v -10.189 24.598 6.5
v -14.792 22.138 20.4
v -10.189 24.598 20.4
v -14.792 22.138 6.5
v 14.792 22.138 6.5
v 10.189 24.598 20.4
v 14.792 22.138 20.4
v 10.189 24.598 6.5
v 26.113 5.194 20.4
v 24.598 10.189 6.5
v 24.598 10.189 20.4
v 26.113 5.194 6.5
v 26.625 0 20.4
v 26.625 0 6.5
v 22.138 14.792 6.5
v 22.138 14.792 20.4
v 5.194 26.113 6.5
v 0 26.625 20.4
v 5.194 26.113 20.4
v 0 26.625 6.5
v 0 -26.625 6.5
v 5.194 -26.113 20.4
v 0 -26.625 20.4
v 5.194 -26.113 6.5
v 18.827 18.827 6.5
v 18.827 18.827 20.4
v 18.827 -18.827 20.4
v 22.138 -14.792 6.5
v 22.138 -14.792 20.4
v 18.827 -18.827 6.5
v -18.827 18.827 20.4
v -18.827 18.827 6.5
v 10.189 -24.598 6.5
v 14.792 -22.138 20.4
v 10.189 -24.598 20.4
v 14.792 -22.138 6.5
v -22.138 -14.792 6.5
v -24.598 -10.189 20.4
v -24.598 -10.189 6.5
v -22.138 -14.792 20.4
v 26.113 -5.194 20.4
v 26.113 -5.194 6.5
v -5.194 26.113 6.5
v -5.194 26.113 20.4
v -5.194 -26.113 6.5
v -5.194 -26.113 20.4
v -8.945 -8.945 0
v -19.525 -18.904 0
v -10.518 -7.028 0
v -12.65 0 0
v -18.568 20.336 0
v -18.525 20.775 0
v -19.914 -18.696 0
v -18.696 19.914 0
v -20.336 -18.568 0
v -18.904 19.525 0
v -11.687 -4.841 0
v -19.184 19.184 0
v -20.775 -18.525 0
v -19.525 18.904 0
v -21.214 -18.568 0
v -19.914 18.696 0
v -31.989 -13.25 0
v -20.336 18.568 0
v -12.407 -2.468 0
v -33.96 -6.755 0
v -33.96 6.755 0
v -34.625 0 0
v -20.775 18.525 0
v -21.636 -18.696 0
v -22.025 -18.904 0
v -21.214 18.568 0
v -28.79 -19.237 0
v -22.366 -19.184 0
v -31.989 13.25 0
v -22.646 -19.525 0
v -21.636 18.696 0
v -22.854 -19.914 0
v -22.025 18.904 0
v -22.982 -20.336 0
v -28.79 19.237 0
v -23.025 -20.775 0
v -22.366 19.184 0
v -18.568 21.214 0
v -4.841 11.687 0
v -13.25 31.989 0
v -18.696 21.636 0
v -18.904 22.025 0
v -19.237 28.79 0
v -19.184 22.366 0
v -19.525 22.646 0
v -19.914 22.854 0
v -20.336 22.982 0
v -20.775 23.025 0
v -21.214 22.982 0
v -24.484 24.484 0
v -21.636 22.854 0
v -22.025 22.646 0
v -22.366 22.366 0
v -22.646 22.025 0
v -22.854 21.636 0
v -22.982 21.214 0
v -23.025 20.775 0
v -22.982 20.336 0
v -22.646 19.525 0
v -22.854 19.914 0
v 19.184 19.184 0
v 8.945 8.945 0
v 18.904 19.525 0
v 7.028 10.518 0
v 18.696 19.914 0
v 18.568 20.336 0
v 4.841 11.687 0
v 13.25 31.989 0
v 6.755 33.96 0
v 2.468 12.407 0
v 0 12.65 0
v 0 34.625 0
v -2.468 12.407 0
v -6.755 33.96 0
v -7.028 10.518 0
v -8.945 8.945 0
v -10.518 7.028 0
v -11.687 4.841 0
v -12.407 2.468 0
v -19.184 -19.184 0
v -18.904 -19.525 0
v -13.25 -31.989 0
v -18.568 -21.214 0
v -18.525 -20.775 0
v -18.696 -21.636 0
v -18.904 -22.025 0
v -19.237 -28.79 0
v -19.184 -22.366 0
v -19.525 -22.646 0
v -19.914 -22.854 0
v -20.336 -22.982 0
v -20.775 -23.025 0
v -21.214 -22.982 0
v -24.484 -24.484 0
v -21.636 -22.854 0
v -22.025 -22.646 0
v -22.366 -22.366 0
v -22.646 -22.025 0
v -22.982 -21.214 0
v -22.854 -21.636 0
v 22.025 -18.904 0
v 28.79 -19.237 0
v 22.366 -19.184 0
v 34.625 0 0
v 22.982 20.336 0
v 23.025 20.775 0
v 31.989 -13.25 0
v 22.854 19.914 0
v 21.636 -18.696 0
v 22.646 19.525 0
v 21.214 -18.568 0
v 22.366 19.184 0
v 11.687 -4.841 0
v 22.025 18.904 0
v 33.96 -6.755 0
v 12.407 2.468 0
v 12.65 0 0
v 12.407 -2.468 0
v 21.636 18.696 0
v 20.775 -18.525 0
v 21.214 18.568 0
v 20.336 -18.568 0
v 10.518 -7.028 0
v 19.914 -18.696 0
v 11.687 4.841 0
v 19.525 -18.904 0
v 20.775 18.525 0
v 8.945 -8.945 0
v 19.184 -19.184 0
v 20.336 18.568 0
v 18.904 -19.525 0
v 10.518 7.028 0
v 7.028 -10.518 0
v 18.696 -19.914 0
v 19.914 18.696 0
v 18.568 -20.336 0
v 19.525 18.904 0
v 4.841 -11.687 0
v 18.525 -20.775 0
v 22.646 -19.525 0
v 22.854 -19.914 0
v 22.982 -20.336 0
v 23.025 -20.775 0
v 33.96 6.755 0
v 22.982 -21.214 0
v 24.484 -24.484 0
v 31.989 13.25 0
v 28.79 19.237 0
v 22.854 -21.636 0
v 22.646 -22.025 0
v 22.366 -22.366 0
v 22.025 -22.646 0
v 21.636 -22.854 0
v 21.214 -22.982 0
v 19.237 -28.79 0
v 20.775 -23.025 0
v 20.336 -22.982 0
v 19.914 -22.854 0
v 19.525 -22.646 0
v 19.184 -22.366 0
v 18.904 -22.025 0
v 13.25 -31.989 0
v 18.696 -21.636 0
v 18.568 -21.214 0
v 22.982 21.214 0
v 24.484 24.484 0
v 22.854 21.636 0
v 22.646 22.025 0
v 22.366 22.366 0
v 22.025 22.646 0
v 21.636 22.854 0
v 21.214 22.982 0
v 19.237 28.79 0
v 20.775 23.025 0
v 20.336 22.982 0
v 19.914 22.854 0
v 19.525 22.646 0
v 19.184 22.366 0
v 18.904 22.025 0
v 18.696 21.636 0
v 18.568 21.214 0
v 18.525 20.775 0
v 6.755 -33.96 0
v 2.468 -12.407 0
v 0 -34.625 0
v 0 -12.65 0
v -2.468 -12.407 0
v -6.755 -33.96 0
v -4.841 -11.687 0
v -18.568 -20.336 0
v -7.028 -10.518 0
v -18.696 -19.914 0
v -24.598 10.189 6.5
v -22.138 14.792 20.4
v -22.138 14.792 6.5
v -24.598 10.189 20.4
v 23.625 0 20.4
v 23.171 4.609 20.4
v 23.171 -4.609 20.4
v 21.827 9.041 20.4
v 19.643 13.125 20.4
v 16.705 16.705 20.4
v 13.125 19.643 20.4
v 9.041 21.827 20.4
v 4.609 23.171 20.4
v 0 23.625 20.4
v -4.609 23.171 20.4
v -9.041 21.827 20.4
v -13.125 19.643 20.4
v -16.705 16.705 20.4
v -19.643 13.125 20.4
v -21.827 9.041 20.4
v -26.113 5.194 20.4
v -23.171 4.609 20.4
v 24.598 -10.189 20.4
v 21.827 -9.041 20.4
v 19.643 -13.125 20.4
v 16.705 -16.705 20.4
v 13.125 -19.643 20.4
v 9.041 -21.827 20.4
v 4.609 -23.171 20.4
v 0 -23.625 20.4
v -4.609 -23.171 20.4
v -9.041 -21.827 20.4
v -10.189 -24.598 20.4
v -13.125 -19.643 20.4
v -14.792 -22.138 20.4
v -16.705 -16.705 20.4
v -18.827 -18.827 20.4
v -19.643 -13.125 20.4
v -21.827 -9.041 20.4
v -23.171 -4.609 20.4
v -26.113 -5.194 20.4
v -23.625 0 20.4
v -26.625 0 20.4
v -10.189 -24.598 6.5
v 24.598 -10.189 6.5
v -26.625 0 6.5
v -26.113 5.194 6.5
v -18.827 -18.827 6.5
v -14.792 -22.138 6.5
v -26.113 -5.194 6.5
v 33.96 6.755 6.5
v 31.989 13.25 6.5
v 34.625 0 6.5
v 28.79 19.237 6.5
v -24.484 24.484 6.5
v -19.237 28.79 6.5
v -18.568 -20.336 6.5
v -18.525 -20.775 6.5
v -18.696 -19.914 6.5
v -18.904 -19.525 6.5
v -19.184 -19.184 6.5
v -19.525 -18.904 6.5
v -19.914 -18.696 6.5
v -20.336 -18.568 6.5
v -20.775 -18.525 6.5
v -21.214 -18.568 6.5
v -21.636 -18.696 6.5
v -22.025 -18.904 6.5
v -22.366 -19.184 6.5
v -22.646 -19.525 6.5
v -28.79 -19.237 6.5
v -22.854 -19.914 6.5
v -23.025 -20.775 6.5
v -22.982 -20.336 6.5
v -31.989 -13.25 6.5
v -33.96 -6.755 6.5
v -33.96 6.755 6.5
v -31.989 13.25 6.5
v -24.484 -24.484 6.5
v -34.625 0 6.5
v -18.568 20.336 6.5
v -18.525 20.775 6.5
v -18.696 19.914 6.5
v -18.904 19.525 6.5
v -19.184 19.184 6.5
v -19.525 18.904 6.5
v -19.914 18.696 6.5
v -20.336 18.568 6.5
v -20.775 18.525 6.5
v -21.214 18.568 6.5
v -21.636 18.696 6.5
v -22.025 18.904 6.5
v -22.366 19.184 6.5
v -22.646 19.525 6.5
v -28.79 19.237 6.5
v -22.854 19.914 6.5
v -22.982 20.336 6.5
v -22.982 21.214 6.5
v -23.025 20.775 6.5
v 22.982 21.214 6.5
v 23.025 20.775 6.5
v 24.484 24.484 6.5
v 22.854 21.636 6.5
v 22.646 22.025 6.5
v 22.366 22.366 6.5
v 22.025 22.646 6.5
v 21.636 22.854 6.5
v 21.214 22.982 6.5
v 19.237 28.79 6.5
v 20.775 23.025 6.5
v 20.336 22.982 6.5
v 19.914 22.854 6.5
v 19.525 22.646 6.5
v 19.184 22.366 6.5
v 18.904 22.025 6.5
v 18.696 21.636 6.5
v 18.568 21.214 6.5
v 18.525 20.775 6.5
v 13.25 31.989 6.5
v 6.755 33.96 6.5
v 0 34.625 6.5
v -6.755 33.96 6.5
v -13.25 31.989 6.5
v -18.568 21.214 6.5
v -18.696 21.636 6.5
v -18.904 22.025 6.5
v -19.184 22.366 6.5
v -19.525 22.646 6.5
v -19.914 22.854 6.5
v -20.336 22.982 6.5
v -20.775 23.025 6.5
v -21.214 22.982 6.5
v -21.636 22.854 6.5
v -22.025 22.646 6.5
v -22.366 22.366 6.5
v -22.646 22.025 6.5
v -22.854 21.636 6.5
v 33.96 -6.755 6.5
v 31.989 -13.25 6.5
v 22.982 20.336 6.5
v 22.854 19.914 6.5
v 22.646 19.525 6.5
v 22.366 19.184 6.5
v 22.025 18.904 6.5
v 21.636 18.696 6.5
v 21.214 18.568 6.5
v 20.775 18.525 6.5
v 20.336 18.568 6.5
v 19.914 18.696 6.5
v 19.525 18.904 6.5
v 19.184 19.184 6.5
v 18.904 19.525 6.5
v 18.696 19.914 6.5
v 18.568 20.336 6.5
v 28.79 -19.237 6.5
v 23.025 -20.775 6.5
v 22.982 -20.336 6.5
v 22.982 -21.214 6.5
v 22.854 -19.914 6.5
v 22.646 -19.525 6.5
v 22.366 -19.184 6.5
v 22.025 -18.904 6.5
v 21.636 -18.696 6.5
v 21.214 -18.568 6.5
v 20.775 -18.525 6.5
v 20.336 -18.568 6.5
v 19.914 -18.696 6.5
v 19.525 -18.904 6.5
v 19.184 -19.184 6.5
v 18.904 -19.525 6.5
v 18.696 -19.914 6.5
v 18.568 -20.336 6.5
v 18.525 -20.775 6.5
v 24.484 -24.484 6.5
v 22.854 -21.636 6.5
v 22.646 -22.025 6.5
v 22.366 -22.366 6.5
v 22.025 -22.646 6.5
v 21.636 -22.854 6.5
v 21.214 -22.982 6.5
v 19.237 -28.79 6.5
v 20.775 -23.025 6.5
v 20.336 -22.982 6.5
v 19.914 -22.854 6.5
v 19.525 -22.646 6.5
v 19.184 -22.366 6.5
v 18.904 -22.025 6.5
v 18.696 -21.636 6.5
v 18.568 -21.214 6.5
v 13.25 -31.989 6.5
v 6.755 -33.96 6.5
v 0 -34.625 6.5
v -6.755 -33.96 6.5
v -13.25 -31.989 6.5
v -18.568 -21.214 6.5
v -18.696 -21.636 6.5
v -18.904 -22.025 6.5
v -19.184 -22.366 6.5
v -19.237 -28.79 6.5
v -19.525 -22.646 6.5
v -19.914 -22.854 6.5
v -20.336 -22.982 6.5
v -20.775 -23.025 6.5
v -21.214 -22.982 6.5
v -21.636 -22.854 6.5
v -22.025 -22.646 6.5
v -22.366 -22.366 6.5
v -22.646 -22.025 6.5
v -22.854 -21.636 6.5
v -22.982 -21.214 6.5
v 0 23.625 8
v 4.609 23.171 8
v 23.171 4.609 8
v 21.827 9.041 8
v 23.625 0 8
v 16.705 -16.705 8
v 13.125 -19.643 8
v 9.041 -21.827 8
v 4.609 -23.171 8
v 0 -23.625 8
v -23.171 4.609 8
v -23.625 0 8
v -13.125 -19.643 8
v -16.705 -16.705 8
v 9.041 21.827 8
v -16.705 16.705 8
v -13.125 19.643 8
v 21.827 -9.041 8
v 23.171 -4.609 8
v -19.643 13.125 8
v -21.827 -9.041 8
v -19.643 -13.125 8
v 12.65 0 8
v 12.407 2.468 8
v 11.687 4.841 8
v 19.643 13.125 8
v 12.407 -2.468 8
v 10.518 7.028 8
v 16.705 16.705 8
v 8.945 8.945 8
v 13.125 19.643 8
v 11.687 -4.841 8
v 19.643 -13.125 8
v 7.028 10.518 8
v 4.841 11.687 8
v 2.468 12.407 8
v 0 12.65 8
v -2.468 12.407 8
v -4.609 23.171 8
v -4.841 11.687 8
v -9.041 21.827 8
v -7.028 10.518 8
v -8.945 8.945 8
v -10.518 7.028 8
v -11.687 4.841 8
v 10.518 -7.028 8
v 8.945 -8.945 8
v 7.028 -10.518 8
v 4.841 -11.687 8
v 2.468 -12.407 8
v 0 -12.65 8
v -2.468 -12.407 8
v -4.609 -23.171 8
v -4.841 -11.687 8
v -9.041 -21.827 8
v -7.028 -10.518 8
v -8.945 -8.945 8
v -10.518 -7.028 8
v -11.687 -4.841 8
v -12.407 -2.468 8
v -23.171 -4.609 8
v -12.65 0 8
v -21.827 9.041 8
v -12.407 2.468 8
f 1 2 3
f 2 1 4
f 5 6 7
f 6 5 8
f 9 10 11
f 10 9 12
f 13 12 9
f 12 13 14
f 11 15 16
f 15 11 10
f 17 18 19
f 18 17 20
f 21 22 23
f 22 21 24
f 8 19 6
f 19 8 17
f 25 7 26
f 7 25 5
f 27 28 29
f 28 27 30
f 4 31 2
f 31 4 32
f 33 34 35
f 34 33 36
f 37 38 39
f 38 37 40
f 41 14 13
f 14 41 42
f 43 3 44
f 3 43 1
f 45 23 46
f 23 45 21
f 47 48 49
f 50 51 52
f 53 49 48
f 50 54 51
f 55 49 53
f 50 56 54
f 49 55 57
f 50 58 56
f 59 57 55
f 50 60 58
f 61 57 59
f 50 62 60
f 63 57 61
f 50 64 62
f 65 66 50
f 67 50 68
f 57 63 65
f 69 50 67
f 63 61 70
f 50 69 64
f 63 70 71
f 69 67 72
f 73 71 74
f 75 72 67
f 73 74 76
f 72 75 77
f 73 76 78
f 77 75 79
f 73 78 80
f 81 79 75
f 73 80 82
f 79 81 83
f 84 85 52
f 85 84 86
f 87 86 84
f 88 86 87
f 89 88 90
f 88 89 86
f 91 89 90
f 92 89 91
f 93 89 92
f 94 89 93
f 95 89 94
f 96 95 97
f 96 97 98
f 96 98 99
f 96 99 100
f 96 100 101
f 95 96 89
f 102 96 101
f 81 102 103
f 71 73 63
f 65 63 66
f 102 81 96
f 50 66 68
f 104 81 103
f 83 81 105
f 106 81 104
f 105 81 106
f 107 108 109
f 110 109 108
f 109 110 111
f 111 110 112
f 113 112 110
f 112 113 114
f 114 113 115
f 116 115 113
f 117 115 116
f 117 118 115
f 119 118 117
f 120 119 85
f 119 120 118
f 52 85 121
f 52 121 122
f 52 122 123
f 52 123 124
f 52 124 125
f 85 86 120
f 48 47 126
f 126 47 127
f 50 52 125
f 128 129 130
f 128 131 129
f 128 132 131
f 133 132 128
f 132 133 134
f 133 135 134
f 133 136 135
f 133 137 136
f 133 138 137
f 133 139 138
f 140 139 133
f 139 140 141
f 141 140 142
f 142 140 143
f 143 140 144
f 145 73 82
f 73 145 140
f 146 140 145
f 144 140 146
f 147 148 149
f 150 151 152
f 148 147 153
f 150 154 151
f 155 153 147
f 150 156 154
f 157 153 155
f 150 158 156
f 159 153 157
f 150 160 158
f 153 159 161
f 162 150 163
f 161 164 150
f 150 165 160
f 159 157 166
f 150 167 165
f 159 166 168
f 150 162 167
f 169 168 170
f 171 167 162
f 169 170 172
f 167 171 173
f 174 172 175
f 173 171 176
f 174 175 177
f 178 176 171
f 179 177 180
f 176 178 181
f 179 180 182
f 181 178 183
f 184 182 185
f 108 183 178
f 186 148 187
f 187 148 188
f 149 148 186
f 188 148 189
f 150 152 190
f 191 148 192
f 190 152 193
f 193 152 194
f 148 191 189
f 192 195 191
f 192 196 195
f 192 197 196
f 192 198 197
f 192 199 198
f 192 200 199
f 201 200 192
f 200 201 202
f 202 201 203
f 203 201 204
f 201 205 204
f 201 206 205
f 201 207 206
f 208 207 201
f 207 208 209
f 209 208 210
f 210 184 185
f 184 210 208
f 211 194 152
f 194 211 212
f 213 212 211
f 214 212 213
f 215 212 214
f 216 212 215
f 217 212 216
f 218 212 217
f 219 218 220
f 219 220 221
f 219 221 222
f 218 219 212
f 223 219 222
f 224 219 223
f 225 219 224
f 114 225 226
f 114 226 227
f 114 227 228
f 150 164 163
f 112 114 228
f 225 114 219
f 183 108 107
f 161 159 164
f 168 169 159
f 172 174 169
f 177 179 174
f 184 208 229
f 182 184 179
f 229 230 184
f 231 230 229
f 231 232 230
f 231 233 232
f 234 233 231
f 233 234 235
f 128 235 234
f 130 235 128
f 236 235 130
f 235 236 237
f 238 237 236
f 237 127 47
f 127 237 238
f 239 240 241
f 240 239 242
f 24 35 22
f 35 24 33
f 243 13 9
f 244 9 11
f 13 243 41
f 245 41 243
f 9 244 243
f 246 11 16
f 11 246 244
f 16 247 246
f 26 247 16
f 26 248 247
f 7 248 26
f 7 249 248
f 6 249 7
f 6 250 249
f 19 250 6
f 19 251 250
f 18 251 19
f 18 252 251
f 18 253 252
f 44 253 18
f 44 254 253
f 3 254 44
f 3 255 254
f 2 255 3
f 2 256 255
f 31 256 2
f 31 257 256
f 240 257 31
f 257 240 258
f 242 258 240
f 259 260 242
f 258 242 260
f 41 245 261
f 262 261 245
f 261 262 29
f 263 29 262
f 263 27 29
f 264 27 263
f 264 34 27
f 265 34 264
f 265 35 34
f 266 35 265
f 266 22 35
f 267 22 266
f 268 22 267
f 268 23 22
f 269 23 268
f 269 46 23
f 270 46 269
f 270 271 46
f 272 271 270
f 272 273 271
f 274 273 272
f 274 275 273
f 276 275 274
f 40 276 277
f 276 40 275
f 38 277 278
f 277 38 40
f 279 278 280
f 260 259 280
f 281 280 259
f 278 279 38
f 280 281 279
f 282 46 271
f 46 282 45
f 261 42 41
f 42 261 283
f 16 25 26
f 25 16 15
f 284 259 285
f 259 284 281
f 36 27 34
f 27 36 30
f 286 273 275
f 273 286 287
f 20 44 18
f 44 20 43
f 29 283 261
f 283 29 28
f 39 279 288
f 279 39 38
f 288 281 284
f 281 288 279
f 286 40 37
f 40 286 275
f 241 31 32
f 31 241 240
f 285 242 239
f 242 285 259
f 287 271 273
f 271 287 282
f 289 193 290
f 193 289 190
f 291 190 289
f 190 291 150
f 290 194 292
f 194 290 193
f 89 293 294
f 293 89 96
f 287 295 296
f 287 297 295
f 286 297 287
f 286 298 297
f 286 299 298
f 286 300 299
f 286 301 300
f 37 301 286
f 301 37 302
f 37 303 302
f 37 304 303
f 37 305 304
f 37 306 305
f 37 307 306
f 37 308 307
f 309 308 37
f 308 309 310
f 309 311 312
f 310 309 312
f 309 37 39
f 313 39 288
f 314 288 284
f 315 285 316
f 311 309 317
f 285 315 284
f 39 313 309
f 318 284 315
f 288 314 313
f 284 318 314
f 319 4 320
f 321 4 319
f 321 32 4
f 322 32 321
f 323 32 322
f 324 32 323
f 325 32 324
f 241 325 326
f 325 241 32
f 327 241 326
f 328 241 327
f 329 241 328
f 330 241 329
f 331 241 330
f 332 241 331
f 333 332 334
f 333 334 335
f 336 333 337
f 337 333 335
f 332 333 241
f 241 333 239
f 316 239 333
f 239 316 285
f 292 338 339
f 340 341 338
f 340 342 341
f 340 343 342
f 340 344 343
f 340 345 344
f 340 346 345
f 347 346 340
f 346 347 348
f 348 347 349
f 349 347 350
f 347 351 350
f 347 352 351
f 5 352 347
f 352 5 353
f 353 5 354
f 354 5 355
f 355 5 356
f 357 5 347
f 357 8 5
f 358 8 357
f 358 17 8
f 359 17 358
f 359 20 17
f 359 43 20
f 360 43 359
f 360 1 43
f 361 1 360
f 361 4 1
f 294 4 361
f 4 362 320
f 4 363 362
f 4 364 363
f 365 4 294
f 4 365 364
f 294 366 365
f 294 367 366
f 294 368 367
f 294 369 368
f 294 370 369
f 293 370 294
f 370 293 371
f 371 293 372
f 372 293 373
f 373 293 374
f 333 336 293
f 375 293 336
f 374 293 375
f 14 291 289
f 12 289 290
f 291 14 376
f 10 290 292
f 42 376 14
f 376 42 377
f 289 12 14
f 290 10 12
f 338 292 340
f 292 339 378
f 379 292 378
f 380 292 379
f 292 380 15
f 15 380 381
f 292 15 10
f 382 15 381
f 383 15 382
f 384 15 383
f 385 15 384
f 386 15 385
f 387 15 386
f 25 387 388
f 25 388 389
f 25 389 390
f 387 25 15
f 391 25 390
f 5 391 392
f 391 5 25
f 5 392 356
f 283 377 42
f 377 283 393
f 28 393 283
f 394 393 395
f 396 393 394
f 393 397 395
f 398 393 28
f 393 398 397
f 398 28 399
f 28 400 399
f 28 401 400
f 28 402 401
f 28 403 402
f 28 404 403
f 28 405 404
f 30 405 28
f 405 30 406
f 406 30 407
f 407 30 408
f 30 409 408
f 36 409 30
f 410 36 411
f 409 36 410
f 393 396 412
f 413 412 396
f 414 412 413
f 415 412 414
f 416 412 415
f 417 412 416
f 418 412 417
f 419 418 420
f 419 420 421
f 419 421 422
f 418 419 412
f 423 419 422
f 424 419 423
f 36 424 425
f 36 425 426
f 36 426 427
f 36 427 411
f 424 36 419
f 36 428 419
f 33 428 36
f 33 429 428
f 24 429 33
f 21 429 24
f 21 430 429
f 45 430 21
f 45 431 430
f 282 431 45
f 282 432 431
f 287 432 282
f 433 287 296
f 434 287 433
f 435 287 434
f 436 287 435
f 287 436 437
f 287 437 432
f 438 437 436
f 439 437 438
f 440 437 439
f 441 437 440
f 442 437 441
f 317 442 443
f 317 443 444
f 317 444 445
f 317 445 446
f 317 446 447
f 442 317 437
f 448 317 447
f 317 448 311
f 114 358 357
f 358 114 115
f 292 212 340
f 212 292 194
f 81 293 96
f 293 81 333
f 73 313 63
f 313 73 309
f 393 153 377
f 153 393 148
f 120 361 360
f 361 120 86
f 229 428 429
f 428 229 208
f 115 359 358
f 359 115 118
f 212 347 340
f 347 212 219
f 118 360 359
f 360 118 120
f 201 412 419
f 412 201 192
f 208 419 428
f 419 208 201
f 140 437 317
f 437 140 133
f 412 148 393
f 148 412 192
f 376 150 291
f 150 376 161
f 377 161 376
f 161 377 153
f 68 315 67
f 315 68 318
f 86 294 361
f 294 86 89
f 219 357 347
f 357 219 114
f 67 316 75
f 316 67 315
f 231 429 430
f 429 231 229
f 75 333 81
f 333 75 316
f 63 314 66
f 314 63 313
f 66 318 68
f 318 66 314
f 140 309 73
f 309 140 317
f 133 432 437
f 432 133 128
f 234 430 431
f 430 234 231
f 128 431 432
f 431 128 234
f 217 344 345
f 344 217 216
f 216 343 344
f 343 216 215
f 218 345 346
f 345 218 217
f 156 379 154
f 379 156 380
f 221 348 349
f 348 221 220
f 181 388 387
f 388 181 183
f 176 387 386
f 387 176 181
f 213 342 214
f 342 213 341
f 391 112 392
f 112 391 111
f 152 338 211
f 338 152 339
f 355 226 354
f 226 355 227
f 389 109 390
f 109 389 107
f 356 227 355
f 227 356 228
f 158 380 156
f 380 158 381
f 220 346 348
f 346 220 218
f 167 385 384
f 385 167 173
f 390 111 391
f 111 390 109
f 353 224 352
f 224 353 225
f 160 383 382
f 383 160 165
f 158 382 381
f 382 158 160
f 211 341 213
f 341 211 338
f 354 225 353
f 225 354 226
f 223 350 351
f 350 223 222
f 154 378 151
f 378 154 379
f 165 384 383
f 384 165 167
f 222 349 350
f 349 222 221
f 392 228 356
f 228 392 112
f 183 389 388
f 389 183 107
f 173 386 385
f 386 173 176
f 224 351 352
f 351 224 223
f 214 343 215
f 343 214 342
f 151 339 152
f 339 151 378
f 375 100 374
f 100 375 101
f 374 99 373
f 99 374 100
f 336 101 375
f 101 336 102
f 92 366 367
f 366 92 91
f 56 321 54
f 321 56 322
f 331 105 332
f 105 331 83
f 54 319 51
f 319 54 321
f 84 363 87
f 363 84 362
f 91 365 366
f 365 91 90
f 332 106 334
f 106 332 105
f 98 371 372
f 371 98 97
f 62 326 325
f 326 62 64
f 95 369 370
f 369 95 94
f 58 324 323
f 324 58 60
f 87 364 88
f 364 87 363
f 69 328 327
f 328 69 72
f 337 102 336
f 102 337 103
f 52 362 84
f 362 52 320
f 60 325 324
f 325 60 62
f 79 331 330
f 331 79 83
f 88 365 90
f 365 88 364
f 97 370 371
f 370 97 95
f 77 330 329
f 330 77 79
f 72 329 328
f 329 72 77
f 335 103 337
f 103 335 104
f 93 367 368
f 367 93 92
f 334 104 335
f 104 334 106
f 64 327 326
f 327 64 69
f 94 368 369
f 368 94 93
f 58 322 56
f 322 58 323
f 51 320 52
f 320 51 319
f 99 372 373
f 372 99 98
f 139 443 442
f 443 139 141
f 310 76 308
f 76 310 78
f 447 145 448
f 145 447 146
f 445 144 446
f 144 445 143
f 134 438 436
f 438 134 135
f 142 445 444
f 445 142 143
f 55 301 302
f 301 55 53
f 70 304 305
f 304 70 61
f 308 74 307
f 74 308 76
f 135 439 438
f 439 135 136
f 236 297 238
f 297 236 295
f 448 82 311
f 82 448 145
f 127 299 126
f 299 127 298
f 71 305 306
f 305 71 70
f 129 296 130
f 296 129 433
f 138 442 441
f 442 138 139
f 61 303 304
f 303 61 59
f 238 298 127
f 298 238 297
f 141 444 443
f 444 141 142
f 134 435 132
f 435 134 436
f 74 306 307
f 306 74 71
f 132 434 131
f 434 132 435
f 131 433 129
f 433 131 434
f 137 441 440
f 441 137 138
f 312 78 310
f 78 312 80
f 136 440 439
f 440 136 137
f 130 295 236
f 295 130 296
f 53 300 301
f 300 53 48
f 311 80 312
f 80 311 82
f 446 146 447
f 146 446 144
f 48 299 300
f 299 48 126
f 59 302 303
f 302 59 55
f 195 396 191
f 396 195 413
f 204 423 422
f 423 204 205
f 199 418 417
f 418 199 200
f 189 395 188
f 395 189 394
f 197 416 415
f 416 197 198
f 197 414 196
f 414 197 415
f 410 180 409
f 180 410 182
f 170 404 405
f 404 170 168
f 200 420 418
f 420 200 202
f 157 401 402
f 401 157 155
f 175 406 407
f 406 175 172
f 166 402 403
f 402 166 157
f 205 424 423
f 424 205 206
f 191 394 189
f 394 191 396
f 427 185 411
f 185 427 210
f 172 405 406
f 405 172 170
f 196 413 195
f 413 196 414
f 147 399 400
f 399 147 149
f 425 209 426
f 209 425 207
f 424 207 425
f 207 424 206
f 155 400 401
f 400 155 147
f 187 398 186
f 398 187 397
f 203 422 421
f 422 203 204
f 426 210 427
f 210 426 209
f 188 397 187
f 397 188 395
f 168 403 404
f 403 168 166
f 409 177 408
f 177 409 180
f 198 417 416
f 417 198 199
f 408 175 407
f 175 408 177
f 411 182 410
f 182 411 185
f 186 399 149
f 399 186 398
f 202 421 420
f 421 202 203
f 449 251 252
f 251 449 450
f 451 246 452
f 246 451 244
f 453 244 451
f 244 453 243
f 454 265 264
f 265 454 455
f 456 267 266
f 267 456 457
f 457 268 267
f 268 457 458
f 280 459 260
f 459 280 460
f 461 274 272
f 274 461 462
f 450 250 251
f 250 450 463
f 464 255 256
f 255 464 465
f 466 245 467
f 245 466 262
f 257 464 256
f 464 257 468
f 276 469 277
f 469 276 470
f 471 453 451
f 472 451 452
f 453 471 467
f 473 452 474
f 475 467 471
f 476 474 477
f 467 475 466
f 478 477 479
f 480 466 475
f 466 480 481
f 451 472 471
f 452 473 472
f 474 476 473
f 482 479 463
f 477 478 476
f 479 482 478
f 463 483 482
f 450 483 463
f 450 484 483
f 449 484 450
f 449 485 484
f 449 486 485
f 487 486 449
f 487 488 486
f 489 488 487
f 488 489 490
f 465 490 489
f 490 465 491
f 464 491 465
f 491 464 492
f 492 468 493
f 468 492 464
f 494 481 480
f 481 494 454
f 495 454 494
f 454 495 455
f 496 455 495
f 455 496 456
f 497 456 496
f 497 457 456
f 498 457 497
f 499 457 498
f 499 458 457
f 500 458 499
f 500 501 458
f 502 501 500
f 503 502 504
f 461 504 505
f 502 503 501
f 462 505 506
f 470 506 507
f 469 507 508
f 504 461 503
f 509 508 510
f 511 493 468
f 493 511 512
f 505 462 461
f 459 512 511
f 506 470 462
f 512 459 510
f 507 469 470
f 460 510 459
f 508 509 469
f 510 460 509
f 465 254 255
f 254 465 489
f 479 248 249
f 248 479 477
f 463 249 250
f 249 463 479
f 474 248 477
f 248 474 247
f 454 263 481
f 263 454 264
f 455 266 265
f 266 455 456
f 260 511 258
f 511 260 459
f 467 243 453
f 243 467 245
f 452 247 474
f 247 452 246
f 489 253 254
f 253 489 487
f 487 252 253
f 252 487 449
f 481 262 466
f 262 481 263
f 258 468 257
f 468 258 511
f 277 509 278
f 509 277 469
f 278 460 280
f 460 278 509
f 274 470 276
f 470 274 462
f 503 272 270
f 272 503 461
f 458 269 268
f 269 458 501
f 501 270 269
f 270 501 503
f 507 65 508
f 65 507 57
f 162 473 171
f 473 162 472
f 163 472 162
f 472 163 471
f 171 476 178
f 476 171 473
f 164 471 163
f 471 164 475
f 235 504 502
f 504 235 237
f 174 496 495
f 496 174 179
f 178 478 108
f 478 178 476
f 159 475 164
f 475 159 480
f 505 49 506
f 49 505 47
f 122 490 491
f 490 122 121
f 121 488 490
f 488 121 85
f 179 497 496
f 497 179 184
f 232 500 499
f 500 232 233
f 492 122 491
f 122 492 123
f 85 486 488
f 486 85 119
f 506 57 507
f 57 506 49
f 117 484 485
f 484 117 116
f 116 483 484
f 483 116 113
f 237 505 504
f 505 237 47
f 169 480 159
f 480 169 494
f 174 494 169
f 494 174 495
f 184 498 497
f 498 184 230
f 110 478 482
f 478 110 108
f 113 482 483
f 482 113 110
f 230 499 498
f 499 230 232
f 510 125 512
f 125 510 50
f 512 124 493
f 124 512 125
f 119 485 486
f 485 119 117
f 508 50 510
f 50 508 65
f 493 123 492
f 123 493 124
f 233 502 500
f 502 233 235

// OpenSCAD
$fn = 32;

// ----------------------------------------------------------------------
// Bearing housing: seat for 6005 (47 x 12 mm), 53.25 mm body
// ----------------------------------------------------------------------

// --- parameters (mm) ---
body_od = 53.25;          // housing outside diameter
body_h = 20.4;            // overall housing height
wall = 3;                 // wall thickness
pocket_d = 47.25;         // 6005 seat, 0.25 mm clearance
seat_h = 12.4;            // pocket depth
shoulder = 3;             // shoulder under the bearing
pass_d = 25.3;            // shaft passage
flange_dia = 69.25;       // mounting flange diameter
flange_t = 5;             // flange thickness
bolt_d = 4.5;             // flange bolt clearance
bolt_r = 29.38;           // flange bolt circle radius

module body() {
  cylinder(h = body_h, d = body_od);
}

module flange() {
  /* flange sunk 1.5 mm into the body */
  cylinder(h = flange_t + 1.5, d = flange_dia);
}

difference() {
  union() {
    body();
    flange();
  }
  translate([0, 0, body_h - seat_h]) cylinder(h = seat_h + 1, d = pocket_d);
  translate([0, 0, -1]) cylinder(h = body_h - seat_h + 1, d = pass_d);
  for (i = [0 : 3]) rotate([0, 0, 45 + i * 90]) translate([bolt_r, 0, -1])
    cylinder(h = flange_t + 3, d = bolt_d);
}
